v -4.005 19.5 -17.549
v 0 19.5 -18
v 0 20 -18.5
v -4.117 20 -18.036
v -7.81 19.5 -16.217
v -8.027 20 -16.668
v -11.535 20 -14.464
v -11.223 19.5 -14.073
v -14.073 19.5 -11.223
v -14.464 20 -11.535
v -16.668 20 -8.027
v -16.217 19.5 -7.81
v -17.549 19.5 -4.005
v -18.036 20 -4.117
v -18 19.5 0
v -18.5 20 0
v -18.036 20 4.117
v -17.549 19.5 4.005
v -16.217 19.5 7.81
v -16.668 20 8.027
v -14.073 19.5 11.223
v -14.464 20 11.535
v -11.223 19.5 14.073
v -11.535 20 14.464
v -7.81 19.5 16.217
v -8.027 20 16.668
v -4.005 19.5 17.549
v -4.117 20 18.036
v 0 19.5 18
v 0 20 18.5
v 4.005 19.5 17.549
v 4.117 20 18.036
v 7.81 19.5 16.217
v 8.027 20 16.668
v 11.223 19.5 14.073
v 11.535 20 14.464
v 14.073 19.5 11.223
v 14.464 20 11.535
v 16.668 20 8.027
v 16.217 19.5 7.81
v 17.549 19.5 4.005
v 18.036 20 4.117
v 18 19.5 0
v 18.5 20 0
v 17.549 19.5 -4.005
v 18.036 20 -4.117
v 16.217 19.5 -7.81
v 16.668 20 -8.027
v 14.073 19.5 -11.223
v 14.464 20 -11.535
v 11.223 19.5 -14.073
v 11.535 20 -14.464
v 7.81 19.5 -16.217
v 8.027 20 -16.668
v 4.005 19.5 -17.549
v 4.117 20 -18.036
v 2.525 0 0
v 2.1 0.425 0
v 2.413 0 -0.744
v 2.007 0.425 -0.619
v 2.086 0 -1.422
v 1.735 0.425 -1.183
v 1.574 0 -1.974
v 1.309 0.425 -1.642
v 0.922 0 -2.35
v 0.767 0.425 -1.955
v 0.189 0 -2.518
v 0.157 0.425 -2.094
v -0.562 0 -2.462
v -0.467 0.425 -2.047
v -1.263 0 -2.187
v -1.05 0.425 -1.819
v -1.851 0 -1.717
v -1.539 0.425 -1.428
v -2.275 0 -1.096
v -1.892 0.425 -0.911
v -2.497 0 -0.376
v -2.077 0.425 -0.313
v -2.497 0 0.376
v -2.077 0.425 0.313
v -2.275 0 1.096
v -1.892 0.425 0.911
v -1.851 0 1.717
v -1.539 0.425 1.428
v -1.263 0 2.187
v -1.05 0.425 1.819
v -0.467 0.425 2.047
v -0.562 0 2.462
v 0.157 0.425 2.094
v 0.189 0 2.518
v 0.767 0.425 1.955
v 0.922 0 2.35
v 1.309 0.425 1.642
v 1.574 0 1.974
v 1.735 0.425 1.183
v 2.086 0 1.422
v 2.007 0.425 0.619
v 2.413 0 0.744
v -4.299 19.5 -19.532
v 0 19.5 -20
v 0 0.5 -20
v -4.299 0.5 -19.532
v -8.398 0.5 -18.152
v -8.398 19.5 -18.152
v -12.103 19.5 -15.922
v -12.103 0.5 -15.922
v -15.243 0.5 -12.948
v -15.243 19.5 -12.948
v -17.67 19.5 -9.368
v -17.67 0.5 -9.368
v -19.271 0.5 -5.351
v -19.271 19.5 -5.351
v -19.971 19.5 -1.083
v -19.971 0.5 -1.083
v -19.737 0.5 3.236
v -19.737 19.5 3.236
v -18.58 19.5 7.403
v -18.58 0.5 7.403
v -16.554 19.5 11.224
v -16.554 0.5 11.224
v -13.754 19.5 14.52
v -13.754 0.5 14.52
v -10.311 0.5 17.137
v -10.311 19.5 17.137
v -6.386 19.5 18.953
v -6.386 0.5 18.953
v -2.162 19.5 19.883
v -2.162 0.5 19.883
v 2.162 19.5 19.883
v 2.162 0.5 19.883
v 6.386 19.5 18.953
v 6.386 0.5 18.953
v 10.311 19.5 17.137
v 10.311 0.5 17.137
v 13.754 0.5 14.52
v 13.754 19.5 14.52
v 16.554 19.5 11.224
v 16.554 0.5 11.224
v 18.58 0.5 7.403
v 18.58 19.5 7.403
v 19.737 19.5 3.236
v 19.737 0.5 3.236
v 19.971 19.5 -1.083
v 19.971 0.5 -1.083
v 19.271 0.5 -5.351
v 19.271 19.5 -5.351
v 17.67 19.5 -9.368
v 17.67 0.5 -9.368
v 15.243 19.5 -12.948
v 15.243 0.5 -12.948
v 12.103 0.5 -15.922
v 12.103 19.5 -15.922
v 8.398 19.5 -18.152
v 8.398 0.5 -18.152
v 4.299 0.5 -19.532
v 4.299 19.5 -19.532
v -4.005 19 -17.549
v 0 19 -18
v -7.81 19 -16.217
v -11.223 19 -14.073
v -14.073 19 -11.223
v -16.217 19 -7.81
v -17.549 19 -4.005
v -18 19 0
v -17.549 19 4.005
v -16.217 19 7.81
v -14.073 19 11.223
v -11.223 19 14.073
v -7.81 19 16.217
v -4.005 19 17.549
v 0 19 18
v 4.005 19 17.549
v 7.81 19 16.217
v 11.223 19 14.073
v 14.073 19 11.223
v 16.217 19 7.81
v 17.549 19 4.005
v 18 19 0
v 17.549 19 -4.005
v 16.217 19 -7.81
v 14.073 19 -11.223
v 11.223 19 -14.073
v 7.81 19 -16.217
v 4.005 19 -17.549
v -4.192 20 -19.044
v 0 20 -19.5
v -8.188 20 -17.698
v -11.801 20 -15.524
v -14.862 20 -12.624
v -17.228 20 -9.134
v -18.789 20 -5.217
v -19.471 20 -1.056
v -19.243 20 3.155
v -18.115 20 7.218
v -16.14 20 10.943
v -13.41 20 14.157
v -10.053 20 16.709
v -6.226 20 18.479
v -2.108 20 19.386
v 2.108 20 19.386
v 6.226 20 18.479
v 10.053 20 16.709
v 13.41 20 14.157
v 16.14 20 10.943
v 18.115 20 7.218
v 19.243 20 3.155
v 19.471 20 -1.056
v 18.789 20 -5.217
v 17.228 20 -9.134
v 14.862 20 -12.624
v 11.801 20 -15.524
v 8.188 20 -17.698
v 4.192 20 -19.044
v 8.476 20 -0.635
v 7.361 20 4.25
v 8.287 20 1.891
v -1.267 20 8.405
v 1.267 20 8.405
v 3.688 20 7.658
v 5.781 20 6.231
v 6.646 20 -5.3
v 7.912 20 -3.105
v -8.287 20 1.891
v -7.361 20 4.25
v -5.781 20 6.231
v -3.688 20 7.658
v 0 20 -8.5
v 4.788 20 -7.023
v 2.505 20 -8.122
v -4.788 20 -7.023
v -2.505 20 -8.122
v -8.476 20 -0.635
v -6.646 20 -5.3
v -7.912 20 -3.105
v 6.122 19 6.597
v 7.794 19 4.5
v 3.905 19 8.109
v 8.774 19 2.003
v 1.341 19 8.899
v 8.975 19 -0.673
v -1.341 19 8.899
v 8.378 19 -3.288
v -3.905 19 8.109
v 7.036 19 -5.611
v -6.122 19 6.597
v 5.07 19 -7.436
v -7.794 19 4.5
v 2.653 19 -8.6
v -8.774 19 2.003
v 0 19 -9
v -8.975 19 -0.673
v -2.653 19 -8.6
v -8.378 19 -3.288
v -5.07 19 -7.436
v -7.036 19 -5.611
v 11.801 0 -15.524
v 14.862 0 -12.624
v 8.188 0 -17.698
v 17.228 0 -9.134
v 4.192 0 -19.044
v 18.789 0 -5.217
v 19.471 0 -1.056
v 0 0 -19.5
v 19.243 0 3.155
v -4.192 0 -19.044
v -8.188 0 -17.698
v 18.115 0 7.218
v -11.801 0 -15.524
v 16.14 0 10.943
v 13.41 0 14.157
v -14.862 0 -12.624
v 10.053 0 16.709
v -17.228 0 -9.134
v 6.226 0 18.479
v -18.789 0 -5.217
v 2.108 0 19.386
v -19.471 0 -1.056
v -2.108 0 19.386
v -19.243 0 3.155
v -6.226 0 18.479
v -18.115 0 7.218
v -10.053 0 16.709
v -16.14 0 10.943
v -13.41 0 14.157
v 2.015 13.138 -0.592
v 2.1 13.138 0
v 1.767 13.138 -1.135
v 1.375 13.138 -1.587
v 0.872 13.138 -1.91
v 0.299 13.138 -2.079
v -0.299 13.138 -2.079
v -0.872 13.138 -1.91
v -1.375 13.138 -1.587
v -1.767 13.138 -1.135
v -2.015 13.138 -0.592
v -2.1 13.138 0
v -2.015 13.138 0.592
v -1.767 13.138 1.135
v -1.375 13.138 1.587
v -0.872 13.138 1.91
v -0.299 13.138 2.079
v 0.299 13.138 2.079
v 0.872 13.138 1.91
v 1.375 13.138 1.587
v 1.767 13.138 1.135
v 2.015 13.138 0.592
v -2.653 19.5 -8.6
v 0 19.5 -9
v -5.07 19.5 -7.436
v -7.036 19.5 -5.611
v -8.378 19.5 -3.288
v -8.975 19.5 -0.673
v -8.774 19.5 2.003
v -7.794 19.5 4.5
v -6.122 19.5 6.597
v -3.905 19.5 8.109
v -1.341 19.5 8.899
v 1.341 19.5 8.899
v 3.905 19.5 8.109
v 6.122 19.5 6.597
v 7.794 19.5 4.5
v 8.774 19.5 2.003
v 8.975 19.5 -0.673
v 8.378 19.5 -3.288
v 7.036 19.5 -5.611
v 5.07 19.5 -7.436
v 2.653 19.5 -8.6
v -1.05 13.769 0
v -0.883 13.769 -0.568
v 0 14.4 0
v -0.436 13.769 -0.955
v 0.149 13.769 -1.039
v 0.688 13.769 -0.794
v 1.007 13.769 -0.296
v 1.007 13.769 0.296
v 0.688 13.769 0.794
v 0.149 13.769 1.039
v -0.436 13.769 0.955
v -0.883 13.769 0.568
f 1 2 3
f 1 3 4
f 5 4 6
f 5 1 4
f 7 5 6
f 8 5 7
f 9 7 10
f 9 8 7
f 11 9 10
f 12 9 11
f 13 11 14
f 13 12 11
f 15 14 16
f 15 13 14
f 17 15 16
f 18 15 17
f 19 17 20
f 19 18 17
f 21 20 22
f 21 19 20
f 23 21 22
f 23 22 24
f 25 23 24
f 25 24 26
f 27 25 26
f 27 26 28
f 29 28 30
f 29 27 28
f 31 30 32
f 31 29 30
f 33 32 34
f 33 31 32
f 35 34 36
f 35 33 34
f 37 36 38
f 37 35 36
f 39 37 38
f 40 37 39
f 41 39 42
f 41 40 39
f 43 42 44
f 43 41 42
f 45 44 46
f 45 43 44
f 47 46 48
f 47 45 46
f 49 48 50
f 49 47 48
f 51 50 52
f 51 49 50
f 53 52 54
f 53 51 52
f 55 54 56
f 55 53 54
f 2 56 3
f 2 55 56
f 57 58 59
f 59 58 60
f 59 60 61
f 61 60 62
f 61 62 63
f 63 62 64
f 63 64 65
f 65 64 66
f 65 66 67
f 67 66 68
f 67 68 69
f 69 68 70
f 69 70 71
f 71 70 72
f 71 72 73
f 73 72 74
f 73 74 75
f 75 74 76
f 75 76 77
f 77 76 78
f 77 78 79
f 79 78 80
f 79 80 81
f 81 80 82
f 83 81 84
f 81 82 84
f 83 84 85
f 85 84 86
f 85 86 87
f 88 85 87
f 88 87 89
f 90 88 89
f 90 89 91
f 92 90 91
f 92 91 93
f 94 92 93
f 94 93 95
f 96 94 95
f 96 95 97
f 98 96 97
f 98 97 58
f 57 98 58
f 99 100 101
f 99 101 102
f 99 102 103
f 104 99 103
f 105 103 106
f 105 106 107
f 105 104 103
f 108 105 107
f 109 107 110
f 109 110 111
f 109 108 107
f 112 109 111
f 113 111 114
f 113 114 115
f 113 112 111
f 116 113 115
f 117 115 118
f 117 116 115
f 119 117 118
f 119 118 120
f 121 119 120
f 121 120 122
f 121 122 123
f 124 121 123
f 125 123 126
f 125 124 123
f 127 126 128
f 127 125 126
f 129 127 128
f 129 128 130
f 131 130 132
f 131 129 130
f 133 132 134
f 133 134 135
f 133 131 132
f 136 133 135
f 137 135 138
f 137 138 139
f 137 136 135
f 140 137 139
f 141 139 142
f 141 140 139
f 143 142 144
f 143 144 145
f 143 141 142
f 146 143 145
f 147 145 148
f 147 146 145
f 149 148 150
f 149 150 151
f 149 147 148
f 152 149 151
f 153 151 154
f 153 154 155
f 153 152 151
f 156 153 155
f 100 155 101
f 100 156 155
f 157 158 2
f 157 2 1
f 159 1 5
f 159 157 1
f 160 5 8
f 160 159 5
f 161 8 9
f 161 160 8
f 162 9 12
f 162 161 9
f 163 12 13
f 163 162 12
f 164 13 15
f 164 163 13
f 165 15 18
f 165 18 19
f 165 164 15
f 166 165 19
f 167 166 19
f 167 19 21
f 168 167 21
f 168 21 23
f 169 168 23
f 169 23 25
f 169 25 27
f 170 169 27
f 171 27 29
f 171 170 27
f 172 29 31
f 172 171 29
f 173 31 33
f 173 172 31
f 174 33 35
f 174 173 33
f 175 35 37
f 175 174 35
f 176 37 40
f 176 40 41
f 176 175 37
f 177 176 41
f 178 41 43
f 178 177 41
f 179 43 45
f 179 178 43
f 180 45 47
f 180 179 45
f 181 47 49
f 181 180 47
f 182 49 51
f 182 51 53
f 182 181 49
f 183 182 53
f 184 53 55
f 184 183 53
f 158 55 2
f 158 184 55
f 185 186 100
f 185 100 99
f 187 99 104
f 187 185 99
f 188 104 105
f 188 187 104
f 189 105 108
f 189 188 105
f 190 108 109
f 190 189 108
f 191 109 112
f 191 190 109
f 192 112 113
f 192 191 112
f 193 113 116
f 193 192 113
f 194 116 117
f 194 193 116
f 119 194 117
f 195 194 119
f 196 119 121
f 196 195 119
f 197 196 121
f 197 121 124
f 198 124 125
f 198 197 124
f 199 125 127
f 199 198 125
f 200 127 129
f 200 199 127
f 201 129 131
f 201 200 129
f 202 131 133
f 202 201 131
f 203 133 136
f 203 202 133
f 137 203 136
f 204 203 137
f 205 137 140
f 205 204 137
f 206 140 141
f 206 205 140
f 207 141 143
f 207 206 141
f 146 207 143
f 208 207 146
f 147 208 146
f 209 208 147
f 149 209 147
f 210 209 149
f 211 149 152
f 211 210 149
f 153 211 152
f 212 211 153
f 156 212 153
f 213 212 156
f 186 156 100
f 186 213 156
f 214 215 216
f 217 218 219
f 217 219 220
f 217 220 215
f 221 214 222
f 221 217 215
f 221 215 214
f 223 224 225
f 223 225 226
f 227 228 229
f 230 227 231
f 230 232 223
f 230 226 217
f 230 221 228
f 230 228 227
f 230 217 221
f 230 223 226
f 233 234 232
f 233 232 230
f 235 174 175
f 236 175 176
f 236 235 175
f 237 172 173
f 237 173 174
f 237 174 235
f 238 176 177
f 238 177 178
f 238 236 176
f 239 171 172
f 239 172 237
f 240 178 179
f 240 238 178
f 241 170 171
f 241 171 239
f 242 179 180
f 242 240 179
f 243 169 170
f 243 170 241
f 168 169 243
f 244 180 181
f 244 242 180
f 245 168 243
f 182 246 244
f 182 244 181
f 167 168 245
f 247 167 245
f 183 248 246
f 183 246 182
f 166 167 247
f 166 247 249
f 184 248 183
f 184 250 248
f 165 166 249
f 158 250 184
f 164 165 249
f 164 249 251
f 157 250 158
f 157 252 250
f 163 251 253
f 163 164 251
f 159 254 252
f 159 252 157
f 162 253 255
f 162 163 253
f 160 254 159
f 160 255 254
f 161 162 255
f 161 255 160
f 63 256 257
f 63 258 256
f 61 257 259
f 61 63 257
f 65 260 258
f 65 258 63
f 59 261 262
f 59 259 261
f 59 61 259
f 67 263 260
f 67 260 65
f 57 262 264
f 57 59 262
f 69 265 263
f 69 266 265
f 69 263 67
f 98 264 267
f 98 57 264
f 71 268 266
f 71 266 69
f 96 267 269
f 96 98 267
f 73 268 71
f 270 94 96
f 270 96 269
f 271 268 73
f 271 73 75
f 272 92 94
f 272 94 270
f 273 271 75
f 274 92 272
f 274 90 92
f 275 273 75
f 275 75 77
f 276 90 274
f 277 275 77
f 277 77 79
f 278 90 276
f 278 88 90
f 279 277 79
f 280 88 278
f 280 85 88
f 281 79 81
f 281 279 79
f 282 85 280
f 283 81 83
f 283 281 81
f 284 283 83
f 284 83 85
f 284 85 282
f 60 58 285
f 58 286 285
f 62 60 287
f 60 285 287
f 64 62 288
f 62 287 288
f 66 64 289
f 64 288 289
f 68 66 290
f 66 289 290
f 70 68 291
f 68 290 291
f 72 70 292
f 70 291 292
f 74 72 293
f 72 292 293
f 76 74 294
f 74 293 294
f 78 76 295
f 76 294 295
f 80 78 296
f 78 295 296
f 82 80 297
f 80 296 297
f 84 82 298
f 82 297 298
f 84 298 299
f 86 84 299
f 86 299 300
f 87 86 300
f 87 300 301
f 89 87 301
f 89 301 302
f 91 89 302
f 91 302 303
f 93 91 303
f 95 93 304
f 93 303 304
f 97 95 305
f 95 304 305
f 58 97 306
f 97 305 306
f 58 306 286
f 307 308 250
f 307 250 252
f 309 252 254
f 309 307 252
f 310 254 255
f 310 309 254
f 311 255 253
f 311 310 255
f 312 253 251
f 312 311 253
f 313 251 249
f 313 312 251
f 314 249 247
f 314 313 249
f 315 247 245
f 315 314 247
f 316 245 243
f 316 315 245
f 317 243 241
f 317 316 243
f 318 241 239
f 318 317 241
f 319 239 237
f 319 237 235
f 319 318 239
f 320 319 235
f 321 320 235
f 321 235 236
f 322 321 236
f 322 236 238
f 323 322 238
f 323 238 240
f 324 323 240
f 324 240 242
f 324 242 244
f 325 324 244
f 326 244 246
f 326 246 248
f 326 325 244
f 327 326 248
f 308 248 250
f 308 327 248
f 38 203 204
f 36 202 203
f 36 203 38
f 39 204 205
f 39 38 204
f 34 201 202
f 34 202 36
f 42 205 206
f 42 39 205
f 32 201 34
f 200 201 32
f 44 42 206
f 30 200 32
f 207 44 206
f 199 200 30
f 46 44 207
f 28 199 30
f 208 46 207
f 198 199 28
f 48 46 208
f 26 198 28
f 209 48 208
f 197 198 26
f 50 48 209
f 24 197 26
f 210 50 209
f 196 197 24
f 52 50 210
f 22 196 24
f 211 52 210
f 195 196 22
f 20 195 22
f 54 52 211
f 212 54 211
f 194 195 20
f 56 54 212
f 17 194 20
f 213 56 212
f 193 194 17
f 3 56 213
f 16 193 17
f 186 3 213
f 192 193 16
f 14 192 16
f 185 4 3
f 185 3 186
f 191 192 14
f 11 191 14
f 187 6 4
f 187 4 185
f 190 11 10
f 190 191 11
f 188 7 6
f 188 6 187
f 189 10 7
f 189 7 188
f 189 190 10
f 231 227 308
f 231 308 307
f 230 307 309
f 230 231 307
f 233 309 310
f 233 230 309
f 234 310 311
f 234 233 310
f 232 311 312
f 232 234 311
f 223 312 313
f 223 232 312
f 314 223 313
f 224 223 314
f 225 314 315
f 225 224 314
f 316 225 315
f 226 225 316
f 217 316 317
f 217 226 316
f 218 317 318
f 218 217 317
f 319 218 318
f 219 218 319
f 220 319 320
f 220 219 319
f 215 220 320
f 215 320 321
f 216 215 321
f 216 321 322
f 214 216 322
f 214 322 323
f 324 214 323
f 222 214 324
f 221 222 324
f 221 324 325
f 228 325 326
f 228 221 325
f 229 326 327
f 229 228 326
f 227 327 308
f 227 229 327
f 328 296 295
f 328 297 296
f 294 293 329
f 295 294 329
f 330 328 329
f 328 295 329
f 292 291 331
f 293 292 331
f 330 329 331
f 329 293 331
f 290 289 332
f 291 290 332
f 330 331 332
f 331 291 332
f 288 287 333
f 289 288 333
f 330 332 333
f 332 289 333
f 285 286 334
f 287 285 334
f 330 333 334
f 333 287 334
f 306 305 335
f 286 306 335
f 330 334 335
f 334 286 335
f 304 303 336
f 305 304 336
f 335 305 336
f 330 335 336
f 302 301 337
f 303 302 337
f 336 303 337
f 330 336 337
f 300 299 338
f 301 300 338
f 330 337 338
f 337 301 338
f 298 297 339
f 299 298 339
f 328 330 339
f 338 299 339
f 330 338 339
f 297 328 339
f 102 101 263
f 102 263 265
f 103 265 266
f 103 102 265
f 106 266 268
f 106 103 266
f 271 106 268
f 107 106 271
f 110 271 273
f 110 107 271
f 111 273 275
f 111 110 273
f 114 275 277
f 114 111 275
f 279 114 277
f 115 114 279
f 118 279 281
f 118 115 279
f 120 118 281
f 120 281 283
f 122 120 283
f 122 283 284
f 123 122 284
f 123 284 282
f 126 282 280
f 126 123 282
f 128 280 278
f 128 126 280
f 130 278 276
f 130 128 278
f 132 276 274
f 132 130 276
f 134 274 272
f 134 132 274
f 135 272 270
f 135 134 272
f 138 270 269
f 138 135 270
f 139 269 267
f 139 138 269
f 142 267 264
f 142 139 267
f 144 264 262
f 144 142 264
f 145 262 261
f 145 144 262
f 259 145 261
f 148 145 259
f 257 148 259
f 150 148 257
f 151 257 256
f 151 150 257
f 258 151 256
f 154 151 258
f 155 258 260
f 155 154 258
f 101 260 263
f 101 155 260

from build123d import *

# Parameters (mm, degrees)
CHAMFER1_SIZE                   = 0.5
M5X0_8_TAPPED_HOLE1_D           = 4.2
M5X0_8_TAPPED_HOLE1_DEPTH       = 13.1381927
M5X0_8_TAPPED_HOLE1_CSINK_D     = 5.05
M5X0_8_TAPPED_HOLE1_CSINK_ANGLE = 90
M5X0_8_TAPPED_HOLE1_TIP         = 1.2618073


with BuildPart() as part:
    # Sketch1 → Revolve1 (revolve)
    with BuildSketch(Plane(origin=(0, 0, 0), x_dir=(0, 0, -1), z_dir=(1, 0, 0))):
        Polygon((0, 0), (20, 0), (20, 20), (18, 20), (18, 19), (9, 19), (9, 20), (0, 20), align=None)
    revolve(axis=Axis((0, 0, 0), (0, 1, 0)))

    # Chamfer1
    chamfer1_edges = [part.edges().sort_by_distance(p)[0] for p in [
        (0, 20, 9),
        (0, 20, 18),
        (0, 20, 20),
        (0, 0, 20),
    ]]
    chamfer(chamfer1_edges, length=CHAMFER1_SIZE)

    # M5x0.8 Tapped Hole1
    with Locations(Plane(origin=(0, 0, 0), x_dir=(-1, 0, 0), z_dir=(0, -1, 0))):
        with Locations((0, 0)):
            CounterSinkHole(M5X0_8_TAPPED_HOLE1_D / 2, M5X0_8_TAPPED_HOLE1_CSINK_D / 2, depth=M5X0_8_TAPPED_HOLE1_DEPTH, counter_sink_angle=M5X0_8_TAPPED_HOLE1_CSINK_ANGLE)
            with Locations((0, 0, -(M5X0_8_TAPPED_HOLE1_DEPTH + M5X0_8_TAPPED_HOLE1_TIP / 2))):  # 118° drill point
                Cone(0, M5X0_8_TAPPED_HOLE1_D / 2, M5X0_8_TAPPED_HOLE1_TIP, mode=Mode.SUBTRACT)


solid = part.part
